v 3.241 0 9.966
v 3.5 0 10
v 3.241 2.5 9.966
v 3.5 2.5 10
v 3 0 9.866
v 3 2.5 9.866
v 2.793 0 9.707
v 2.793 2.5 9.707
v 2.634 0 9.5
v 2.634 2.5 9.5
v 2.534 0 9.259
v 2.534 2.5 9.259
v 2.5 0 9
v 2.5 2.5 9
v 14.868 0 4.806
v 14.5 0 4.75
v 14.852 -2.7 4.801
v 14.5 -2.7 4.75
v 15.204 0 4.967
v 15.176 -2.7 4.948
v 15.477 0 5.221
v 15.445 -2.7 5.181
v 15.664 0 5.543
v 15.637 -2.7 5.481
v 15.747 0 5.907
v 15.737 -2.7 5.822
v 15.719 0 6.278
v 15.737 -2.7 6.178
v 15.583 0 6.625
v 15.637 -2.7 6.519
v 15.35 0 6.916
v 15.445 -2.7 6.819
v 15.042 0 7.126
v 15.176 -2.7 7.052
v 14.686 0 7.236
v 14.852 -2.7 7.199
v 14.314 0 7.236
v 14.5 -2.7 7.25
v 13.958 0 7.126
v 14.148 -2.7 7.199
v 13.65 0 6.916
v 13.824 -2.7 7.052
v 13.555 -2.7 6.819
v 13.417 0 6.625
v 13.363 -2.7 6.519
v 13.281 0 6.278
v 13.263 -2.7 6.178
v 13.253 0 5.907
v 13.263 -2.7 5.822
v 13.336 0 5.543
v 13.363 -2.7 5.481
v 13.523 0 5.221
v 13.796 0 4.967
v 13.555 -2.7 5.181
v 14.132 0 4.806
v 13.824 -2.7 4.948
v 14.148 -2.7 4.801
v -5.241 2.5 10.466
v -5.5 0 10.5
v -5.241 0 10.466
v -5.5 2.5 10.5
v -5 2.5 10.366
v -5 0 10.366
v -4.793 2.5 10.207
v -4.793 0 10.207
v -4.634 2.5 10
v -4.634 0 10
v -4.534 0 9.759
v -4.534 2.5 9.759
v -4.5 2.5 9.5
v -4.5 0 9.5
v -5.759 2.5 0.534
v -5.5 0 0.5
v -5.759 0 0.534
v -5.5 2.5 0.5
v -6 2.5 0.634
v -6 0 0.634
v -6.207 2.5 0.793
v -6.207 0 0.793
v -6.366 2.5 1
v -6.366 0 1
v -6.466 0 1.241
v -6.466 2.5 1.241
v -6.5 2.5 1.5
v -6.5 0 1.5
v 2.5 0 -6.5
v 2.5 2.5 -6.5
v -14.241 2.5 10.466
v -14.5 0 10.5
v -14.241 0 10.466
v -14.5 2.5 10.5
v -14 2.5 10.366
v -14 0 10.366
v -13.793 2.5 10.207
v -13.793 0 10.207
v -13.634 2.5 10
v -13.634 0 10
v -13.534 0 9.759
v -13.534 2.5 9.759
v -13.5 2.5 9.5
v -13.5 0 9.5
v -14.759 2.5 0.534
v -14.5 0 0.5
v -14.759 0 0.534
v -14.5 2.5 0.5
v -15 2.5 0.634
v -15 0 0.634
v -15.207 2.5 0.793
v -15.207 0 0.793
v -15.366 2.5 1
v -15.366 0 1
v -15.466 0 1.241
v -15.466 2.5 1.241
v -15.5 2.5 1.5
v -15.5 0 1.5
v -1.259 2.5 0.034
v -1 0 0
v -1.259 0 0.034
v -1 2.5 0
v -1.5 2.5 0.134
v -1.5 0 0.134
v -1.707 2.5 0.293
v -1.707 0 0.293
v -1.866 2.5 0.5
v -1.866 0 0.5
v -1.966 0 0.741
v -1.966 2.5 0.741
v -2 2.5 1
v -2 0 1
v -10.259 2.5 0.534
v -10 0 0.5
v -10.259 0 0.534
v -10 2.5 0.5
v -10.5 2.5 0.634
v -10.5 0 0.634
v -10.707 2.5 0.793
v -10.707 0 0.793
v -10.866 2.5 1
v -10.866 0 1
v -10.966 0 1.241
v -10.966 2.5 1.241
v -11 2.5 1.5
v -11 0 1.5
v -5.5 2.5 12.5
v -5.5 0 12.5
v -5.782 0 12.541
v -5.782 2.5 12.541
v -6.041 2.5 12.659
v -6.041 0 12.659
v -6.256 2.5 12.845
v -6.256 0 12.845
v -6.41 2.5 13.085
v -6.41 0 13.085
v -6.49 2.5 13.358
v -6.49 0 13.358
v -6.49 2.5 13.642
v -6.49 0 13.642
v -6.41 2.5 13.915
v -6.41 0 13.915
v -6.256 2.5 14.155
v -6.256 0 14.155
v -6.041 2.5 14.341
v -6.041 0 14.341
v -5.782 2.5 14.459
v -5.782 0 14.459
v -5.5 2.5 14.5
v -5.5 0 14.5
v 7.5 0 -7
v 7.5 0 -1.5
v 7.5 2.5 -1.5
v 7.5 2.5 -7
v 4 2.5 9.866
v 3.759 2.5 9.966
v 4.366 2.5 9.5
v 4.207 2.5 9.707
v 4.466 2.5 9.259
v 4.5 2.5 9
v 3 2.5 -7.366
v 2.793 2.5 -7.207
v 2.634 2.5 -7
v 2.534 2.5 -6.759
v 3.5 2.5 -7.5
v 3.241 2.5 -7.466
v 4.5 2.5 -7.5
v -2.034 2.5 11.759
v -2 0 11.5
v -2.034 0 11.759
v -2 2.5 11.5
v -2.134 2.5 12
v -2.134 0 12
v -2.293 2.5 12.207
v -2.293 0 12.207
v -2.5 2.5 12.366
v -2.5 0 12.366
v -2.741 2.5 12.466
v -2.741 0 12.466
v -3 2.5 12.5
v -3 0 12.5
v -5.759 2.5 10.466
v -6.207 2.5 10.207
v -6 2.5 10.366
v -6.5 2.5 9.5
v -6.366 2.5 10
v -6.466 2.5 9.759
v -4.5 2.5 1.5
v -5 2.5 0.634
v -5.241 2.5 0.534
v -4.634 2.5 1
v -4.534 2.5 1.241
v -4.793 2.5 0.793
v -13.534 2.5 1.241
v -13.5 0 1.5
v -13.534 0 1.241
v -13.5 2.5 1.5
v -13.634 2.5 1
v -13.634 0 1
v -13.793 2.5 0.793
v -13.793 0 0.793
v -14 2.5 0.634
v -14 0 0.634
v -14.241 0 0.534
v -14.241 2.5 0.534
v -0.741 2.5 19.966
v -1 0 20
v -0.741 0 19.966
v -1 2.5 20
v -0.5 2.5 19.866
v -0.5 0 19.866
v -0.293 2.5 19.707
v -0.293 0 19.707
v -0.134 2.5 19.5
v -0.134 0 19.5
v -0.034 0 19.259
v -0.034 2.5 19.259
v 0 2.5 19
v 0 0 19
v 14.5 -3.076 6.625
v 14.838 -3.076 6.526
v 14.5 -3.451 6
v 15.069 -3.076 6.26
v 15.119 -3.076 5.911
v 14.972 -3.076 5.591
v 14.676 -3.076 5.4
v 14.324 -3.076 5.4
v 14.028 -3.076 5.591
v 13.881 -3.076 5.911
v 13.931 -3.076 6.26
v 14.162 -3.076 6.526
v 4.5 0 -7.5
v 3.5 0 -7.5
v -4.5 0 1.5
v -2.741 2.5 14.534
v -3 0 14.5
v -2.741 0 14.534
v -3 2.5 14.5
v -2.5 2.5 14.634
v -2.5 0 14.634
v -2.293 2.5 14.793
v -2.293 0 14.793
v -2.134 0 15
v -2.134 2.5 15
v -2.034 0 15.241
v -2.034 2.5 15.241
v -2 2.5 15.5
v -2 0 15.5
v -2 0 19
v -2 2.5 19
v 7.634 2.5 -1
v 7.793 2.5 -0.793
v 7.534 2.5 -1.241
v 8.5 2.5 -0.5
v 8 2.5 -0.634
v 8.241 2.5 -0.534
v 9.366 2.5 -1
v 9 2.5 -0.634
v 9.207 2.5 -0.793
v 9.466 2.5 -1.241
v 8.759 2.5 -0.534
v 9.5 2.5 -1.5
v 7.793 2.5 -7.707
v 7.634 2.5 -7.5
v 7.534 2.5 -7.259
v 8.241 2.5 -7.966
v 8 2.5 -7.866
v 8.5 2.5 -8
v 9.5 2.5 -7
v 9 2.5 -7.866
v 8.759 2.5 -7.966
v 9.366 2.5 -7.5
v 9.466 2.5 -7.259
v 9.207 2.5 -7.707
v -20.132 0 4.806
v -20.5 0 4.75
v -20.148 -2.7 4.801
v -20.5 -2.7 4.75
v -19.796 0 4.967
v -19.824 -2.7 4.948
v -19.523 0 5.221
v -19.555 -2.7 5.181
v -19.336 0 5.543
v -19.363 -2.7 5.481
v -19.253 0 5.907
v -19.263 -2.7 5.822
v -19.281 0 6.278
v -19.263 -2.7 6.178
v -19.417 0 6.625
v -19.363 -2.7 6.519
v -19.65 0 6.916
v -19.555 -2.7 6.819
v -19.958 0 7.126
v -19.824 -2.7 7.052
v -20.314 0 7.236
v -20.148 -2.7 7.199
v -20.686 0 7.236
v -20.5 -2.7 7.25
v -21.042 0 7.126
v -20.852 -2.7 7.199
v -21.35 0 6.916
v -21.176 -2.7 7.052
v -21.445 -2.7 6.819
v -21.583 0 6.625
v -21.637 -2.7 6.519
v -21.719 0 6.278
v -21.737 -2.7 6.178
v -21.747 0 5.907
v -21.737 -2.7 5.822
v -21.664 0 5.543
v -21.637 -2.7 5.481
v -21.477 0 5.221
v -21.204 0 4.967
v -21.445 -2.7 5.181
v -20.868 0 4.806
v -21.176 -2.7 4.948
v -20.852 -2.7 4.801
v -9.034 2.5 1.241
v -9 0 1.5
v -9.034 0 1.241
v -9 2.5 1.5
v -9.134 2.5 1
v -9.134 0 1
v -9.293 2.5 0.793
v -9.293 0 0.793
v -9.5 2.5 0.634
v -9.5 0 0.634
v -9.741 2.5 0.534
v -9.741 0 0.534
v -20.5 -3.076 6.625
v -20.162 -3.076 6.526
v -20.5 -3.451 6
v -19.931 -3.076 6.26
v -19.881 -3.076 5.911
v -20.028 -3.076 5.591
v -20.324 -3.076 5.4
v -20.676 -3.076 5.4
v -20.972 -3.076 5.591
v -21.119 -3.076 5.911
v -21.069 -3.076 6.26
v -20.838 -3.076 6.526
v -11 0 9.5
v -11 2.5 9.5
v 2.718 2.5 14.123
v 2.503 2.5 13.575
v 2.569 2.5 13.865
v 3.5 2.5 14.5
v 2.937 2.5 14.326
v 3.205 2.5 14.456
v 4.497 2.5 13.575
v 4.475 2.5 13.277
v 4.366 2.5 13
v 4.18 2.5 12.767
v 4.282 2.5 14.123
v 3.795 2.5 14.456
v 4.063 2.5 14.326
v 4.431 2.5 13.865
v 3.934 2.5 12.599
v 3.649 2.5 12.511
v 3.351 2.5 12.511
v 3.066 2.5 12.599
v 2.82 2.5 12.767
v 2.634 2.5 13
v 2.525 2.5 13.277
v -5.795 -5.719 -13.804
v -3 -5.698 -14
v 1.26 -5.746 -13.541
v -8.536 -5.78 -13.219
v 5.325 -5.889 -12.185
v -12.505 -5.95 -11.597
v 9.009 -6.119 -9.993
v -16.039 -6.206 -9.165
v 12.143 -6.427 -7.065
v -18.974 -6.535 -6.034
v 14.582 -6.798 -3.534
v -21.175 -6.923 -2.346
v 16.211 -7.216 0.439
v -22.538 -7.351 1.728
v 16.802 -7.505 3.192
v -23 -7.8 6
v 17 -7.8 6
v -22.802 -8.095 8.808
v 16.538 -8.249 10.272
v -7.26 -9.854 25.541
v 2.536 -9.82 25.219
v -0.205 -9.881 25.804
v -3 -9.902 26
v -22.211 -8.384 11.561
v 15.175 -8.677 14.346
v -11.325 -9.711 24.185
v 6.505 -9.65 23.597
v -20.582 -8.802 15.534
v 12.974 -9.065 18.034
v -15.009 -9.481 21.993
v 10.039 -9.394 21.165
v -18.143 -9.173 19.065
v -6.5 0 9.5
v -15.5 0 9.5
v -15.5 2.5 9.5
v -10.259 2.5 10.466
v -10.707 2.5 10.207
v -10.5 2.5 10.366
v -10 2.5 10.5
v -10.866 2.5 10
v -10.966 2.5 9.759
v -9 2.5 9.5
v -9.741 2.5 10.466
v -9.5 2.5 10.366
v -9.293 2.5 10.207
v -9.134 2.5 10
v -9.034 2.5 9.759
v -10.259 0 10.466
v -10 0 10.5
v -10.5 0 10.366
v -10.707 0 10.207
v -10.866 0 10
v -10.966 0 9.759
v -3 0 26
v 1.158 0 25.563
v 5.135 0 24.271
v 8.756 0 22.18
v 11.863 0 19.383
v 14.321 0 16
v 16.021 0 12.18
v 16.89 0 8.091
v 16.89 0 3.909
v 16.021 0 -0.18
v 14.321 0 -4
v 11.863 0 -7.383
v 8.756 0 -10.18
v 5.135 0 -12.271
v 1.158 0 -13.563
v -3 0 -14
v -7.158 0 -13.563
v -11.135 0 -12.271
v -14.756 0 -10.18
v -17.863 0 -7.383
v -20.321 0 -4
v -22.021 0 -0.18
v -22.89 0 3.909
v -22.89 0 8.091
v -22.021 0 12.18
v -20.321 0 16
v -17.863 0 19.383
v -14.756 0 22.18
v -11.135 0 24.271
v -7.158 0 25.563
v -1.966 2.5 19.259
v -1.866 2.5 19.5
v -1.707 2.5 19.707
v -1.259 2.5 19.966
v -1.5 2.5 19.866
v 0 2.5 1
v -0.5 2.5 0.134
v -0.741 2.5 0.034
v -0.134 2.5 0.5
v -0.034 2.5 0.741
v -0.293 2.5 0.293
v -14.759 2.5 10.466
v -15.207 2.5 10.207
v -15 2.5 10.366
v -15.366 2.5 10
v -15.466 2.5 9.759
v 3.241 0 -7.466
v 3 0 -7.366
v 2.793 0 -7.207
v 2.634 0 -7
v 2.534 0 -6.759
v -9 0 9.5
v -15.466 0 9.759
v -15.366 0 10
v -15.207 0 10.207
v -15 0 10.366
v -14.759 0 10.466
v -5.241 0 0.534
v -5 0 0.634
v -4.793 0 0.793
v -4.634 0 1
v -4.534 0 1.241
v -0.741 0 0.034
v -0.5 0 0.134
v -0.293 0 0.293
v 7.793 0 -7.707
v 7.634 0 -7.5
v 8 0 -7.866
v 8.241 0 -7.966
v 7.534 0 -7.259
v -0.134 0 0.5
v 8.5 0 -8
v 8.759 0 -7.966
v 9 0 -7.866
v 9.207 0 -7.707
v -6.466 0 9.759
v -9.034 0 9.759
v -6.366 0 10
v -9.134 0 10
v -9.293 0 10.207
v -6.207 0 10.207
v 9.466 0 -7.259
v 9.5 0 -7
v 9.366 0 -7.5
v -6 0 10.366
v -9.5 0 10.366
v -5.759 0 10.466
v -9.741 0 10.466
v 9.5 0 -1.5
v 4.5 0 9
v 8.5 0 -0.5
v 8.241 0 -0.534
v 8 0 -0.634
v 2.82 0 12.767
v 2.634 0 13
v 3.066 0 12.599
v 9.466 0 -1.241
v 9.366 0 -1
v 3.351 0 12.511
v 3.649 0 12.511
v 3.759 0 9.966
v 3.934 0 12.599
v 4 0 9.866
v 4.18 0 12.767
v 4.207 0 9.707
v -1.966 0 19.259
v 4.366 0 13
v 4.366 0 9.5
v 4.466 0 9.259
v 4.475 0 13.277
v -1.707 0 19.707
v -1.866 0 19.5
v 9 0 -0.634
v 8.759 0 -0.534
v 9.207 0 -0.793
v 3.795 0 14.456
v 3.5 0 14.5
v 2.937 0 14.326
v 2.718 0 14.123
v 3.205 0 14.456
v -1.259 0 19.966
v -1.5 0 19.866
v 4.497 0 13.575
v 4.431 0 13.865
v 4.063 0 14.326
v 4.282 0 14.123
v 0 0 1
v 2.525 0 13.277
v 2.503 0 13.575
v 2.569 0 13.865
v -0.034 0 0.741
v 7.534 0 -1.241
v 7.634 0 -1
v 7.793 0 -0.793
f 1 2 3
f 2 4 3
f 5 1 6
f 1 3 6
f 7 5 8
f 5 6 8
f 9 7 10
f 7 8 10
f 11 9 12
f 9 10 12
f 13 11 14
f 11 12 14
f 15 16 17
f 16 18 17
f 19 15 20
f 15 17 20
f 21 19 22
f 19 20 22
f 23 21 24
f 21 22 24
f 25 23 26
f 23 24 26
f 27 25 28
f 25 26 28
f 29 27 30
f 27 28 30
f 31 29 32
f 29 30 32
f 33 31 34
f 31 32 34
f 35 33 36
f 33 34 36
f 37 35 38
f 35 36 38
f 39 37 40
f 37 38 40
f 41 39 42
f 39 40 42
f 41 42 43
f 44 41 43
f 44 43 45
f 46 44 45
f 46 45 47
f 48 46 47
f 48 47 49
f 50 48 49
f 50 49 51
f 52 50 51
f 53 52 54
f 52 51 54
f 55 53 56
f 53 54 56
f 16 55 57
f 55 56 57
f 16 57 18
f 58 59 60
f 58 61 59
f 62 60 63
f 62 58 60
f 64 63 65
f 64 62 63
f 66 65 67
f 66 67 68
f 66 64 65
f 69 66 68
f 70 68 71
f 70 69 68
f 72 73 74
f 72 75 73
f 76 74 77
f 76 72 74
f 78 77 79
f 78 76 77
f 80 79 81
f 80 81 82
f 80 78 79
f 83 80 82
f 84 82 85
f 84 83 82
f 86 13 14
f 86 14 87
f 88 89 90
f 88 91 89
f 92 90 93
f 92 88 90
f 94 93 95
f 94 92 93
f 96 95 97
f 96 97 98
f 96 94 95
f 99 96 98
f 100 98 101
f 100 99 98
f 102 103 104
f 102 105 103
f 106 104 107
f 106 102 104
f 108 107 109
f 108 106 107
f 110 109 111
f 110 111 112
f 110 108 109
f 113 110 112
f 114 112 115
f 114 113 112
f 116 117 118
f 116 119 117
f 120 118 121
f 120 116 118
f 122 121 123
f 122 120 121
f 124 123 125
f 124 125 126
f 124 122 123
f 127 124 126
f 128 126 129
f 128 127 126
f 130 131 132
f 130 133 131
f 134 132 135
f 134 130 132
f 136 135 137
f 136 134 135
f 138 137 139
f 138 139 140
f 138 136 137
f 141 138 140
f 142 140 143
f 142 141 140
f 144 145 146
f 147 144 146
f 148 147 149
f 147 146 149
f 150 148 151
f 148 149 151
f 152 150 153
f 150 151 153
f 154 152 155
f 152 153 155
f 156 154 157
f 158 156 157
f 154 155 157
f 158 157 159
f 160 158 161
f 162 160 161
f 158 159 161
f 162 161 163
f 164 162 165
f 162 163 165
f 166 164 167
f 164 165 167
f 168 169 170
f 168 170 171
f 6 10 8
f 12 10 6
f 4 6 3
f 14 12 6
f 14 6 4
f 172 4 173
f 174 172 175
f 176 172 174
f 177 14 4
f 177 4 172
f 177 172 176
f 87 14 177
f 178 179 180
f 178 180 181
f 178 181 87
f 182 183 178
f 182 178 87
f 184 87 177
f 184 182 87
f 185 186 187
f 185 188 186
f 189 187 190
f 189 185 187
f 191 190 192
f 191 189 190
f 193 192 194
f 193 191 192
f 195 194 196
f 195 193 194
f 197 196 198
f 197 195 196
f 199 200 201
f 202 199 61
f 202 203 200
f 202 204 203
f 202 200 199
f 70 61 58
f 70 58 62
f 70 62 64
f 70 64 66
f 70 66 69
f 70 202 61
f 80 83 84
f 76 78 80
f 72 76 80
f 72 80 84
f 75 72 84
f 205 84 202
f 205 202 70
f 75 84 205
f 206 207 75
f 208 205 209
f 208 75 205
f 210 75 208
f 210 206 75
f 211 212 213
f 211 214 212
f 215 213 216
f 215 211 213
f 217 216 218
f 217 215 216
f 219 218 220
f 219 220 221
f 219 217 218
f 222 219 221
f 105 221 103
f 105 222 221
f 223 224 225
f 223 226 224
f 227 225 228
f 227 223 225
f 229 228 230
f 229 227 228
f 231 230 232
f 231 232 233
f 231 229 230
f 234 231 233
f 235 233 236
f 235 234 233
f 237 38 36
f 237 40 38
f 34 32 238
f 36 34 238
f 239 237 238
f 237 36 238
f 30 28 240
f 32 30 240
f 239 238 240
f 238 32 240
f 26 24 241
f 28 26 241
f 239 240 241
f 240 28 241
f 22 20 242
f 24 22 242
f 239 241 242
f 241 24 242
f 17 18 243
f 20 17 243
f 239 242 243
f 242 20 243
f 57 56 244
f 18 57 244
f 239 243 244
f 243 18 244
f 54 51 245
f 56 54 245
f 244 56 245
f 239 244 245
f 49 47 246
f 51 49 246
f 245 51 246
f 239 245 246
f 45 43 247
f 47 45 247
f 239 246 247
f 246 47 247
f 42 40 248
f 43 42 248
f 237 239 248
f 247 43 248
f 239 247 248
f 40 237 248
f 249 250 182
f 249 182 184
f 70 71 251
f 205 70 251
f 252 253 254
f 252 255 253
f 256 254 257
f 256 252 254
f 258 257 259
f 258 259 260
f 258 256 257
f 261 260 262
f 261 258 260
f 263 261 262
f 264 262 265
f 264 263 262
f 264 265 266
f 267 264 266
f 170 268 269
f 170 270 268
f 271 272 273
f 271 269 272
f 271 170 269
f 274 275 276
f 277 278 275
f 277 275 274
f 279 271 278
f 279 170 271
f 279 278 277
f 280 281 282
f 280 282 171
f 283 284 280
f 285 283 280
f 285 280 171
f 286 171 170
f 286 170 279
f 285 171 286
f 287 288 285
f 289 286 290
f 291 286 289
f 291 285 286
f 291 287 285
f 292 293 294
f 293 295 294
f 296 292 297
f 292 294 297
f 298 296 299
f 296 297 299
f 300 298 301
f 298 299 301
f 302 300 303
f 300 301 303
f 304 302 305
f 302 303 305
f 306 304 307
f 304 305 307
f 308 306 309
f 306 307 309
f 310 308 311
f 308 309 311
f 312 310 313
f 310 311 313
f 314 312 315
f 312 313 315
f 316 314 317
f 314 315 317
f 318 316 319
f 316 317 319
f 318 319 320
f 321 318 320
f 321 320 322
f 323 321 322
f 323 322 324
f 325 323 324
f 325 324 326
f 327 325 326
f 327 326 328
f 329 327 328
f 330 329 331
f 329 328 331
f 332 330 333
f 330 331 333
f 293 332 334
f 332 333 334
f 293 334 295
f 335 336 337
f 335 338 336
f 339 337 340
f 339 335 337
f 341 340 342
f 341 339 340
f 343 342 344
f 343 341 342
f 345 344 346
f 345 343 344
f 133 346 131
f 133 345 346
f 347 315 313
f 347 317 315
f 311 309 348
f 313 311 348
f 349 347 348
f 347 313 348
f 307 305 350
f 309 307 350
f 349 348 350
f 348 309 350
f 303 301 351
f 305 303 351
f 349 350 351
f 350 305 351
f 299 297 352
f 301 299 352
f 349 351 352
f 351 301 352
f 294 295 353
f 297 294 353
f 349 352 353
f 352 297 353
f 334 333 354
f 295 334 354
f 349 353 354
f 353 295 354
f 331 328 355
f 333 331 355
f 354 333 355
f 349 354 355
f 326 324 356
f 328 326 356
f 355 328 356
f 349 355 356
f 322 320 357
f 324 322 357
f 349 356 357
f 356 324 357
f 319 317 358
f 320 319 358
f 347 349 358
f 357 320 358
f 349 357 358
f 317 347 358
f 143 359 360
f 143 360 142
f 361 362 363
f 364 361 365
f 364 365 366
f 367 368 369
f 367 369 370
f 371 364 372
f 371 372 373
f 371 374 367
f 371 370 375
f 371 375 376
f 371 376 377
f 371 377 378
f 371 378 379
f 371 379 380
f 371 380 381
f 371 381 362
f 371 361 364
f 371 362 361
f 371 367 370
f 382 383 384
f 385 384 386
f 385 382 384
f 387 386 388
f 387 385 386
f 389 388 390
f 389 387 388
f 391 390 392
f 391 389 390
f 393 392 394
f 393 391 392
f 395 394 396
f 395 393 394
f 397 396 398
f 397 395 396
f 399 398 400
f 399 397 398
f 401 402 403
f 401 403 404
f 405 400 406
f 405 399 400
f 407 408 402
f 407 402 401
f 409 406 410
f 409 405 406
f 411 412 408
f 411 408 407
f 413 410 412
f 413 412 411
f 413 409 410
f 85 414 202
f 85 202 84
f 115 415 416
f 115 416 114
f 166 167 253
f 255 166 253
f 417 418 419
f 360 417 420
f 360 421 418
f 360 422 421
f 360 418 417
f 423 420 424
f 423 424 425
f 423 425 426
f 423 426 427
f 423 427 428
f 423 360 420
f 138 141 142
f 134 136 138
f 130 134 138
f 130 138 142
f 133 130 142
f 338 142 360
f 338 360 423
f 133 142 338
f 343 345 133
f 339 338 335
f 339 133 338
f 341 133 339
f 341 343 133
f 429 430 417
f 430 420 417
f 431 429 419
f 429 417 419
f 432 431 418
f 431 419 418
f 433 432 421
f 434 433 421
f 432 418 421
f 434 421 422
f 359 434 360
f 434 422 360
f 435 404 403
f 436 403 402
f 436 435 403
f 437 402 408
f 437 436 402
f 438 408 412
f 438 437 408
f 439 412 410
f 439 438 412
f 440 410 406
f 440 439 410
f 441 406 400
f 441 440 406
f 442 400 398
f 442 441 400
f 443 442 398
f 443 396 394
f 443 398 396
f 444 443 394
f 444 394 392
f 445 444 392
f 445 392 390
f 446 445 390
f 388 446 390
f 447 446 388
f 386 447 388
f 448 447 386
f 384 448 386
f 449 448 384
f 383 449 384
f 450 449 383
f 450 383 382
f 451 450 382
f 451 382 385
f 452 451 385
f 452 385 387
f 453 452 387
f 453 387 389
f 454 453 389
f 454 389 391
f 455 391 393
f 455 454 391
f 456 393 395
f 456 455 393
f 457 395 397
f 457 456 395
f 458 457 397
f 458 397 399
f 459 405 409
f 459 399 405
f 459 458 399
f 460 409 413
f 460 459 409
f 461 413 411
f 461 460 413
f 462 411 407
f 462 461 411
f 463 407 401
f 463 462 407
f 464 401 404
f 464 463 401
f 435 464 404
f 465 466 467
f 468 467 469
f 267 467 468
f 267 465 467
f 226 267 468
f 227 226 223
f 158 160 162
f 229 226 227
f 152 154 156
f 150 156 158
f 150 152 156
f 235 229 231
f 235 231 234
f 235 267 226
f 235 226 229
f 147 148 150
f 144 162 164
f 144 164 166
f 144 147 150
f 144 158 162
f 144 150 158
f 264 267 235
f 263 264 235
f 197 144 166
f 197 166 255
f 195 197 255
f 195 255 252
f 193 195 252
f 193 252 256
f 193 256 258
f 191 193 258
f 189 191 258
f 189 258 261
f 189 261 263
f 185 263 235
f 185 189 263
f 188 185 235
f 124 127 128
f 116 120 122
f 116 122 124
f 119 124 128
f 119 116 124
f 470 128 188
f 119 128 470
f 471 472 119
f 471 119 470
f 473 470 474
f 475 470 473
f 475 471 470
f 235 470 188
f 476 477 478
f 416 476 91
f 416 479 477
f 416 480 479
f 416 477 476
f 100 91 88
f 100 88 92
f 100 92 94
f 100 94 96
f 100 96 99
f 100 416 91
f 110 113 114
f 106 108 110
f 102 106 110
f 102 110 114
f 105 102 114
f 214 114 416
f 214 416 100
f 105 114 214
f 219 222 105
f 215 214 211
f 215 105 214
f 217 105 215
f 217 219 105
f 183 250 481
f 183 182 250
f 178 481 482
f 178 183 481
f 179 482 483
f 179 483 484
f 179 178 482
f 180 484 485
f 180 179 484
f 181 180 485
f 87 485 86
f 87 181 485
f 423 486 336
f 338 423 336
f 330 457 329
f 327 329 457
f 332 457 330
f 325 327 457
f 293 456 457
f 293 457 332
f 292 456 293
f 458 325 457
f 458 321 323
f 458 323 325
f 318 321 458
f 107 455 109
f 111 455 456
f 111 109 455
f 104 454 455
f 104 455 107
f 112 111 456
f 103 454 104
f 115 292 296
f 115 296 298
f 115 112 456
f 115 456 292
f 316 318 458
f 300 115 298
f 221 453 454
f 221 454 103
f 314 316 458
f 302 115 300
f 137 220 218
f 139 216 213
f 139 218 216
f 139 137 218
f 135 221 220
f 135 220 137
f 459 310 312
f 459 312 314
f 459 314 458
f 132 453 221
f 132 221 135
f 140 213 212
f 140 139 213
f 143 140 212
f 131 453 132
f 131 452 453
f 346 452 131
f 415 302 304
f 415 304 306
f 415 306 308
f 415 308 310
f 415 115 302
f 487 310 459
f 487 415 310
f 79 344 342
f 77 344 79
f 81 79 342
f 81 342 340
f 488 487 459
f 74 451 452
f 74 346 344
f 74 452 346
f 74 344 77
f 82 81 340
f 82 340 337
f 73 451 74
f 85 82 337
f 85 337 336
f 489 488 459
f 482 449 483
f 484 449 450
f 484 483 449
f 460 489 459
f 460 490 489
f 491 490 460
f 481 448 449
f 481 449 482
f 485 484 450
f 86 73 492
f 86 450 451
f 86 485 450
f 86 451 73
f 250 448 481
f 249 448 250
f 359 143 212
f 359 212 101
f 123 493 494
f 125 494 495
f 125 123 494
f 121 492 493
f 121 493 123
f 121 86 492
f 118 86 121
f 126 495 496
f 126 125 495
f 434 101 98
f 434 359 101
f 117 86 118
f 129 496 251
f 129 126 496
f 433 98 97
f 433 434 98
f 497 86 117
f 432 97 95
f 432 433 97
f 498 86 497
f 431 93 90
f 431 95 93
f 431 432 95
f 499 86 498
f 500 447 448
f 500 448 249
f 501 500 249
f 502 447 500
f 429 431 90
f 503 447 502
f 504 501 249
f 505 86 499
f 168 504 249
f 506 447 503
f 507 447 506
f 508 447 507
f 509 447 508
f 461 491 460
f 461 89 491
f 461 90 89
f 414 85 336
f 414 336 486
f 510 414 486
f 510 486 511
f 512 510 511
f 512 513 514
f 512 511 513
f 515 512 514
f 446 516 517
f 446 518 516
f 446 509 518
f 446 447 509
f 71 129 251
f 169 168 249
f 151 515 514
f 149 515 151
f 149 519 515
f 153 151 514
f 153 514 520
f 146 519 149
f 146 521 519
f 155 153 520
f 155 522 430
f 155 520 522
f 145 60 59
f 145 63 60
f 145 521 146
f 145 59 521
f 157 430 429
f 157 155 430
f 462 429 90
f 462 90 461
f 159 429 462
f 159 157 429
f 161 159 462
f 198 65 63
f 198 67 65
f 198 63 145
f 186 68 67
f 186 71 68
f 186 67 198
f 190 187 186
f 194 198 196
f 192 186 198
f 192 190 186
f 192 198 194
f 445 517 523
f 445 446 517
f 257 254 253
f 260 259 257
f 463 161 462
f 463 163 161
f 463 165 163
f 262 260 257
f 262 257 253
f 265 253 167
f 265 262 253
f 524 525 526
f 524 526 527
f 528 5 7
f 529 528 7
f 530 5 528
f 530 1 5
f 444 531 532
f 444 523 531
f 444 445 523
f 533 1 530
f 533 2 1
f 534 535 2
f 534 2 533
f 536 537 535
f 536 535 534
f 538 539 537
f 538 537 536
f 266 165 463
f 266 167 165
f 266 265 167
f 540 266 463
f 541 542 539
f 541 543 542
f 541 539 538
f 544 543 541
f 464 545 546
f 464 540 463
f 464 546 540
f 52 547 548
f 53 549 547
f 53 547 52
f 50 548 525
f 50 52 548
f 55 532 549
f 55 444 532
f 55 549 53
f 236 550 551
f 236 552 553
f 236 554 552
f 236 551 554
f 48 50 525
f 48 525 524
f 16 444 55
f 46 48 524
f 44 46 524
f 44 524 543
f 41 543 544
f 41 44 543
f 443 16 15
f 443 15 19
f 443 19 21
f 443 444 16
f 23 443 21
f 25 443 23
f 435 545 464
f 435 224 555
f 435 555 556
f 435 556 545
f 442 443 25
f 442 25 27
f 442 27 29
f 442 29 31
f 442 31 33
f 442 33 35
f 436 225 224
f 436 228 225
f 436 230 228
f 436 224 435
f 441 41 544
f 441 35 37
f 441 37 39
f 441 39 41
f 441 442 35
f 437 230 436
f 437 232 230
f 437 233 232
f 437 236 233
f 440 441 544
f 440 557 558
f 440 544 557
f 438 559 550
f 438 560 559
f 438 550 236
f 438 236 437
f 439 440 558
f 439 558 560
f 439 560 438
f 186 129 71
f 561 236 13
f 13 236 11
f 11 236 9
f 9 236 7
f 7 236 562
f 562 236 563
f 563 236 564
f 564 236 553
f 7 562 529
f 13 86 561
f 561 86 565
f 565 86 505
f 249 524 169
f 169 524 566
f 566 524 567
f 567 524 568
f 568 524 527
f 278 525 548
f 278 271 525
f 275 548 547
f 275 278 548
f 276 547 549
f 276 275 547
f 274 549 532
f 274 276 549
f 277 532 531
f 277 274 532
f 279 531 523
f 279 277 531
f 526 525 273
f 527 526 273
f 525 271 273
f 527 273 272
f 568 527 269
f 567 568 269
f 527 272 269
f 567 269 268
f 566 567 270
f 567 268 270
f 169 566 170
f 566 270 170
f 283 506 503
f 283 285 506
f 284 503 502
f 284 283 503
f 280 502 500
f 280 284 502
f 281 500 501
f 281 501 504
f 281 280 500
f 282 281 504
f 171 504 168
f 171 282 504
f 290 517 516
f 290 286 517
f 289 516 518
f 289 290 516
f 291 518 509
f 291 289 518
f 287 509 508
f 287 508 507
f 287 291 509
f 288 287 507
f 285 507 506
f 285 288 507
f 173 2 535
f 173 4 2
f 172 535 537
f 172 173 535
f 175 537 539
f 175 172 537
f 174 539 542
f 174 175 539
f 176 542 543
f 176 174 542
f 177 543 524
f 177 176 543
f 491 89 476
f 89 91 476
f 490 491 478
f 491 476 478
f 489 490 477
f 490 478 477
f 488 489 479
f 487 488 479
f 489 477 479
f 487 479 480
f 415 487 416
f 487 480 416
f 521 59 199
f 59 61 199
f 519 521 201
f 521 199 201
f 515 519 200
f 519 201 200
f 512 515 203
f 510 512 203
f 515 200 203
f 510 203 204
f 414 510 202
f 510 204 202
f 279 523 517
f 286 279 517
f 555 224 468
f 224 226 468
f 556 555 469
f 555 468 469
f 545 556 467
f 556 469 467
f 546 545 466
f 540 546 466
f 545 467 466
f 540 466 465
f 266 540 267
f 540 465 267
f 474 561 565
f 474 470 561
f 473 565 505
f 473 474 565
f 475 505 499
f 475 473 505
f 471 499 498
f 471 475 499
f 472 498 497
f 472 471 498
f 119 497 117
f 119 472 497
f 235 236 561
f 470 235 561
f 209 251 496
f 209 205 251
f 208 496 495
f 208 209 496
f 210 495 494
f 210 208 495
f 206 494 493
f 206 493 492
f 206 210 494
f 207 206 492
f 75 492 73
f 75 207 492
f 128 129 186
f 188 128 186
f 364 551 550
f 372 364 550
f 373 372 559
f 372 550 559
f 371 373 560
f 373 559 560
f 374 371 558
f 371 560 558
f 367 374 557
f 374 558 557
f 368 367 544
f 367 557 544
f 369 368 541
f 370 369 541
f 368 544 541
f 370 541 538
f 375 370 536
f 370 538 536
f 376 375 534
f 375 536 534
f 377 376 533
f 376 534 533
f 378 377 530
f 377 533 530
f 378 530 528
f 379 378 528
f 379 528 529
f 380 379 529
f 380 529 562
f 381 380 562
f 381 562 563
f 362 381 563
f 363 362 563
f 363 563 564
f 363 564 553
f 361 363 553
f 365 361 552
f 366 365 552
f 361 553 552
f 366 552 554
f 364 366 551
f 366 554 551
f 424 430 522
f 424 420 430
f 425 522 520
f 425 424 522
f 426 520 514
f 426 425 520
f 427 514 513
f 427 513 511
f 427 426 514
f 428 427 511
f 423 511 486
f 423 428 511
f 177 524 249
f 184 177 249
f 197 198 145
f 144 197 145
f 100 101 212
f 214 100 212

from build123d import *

# Parameters (mm, degrees)
BOSS_EXTRUDE2_DEPTH       = 2.5
SKETCH1_R                 = 1
BOSS_EXTRUDE2_2_DEPTH     = 2.5
SKETCH1_W                 = 2
SKETCH1_H                 = 17.5
BOSS_EXTRUDE2_3_DEPTH     = 2.5
SKETCH1_H_2               = 10
BOSS_EXTRUDE2_4_DEPTH     = 2.5
BOSS_EXTRUDE2_5_DEPTH     = 2.5
BOSS_EXTRUDE2_6_DEPTH     = 2.5
SKETCH1_H_3               = 7.5
BOSS_EXTRUDE2_7_DEPTH     = 2.5
SKETCH1_6_R               = 20
BOSS_EXTRUDE3_DEPTH       = 20
CUT_EXTRUDE1_START        = -27.5000001
CUT_EXTRUDE1_DEPTH        = 40.0000001
FILLET1_R                 = 1
M3X0_5_TAPPED_HOLE1_D     = 2.5
M3X0_5_TAPPED_HOLE1_DEPTH = 2.7
M3X0_5_TAPPED_HOLE1_TIP   = 0.751075774


# Read off the part's stored shape, not the designer's step: Cut-Extrude1
with BuildPart() as part:
    # Sketch1 → Boss-Extrude2 (new body)
    with BuildSketch(Plane(origin=(0, 0, 0), x_dir=(1, 0, 0), z_dir=(0, 1, 0))):
        with BuildLine():
            Line((-2, -20), (0, -20))
            Line((0, -20), (0, 0))
            Line((0, 0), (-2, 0))
            Line((-2, 0), (-2, -12.5))
            Line((-2, -12.5), (-5.5, -12.5))
            ThreePointArc((-5.5, -12.5), (-6.5, -13.5), (-5.5, -14.5))
            Line((-5.5, -14.5), (-2, -14.5))
            Line((-2, -14.5), (-2, -20))
        make_face()
    extrude(amount=BOSS_EXTRUDE2_DEPTH)



with BuildPart() as body_2:
    # Sketch1 → Boss-Extrude2 2 (new body)
    with BuildSketch(Plane(origin=(0, 0, 0), x_dir=(1, 0, 0), z_dir=(0, 1, 0))):
        with Locations(Location((3.5, -13.5, 0), (0, 0, 270))):
            Circle(SKETCH1_R)
    extrude(amount=BOSS_EXTRUDE2_2_DEPTH)


with BuildPart() as body_3:
    # Sketch1 → Boss-Extrude2 3 (new body)
    with BuildSketch(Plane(origin=(0, 0, 0), x_dir=(1, 0, 0), z_dir=(0, 1, 0))):
        with Locations((3.5, -1.25)):
            Rectangle(SKETCH1_W, SKETCH1_H)
    extrude(amount=BOSS_EXTRUDE2_3_DEPTH)


with BuildPart() as body_4:
    # Sketch1 → Boss-Extrude2 4 (new body)
    with BuildSketch(Plane(origin=(0, 0, 0), x_dir=(1, 0, 0), z_dir=(0, 1, 0))):
        with Locations((-5.5, -5.5)):
            Rectangle(SKETCH1_W, SKETCH1_H_2)
    extrude(amount=BOSS_EXTRUDE2_4_DEPTH)


with BuildPart() as body_5:
    # Sketch1 → Boss-Extrude2 5 (new body)
    with BuildSketch(Plane(origin=(0, 0, 0), x_dir=(1, 0, 0), z_dir=(0, 1, 0))):
        with Locations((-10, -5.5)):
            Rectangle(SKETCH1_W, SKETCH1_H_2)
    extrude(amount=BOSS_EXTRUDE2_5_DEPTH)


with BuildPart() as body_6:
    # Sketch1 → Boss-Extrude2 6 (new body)
    with BuildSketch(Plane(origin=(0, 0, 0), x_dir=(1, 0, 0), z_dir=(0, 1, 0))):
        with Locations((-14.5, -5.5)):
            Rectangle(SKETCH1_W, SKETCH1_H_2)
    extrude(amount=BOSS_EXTRUDE2_6_DEPTH)


with BuildPart() as body_7:
    # Sketch1 → Boss-Extrude2 7 (new body)
    with BuildSketch(Plane(origin=(0, 0, 0), x_dir=(1, 0, 0), z_dir=(0, 1, 0))):
        with Locations((8.5, 4.25)):
            Rectangle(SKETCH1_W, SKETCH1_H_3)
    extrude(amount=BOSS_EXTRUDE2_7_DEPTH)


with BuildPart() as part_1:
    add(part.part)

    add(body_2.part)  # Boss-Extrude3 merges body 2

    add(body_3.part)  # Boss-Extrude3 merges body 3

    add(body_4.part)  # Boss-Extrude3 merges body 4

    add(body_5.part)  # Boss-Extrude3 merges body 5

    add(body_6.part)  # Boss-Extrude3 merges body 6

    add(body_7.part)  # Boss-Extrude3 merges body 7
    # Sketch1<6> → Boss-Extrude3 (add)
    with BuildSketch(Plane(origin=(0, 0, 0), x_dir=(1, 0, 0), z_dir=(0, 1, 0))):
        with Locations(Location((-3, -6, 0), (0, 0, 270))):
            Circle(SKETCH1_6_R)
    extrude(amount=-BOSS_EXTRUDE3_DEPTH)

    # Cut-Extrude1 outline → Cut-Extrude1 (cut)
    with BuildSketch(Plane(origin=(4.5, 0, 0), x_dir=(0, 0, -1), z_dir=(1, 0, 0)).offset(CUT_EXTRUDE1_START)):
        Polygon((14, -20), (14, -5.697915295), (-26, -9.902084705), (-26, -20), align=None)
    extrude(amount=CUT_EXTRUDE1_DEPTH, mode=Mode.SUBTRACT)

    # Fillet1
    fillet1_edges = [part_1.edges().sort_by_distance(p)[0] for p in [
        (-13.5, 1.25, 10.5),
        (-13.5, 1.25, 0.5),
        (-9, 1.25, 0.5),
        (-9, 1.25, 10.5),
        (-4.5, 1.25, 0.5),
        (-4.5, 1.25, 10.5),
        (0, 1.25, 20),
        (0, 1.25, 0),
        (9.5, 1.25, -8),
        (9.5, 1.25, -0.5),
        (4.5, 1.25, 10),
        (-15.5, 1.25, 0.5),
        (-15.5, 1.25, 10.5),
        (-11, 1.25, 0.5),
        (-11, 1.25, 10.5),
        (-6.5, 1.25, 0.5),
        (-6.5, 1.25, 10.5),
        (7.5, 1.25, -0.5),
        (7.5, 1.25, -8),
        (2.5, 1.25, -7.5),
        (2.5, 1.25, 10),
        (-2, 1.25, 0),
        (-2, 1.25, 14.5),
        (-2, 1.25, 20),
        (-2, 1.25, 12.5),
    ]]
    fillet(fillet1_edges, radius=FILLET1_R - 0.0001)  # a hair under: the kernel refuses the full size

    # M3x0.5 Tapped Hole1
    with Locations(Plane(origin=(14.5, 0, 6), x_dir=(0, 0, 1), z_dir=(0, 1, 0))):
        with Locations((0, 0), (0, -35)):
            Hole(M3X0_5_TAPPED_HOLE1_D / 2, depth=M3X0_5_TAPPED_HOLE1_DEPTH)
            with Locations((0, 0, -(M3X0_5_TAPPED_HOLE1_DEPTH + M3X0_5_TAPPED_HOLE1_TIP / 2))):  # 118° drill point
                Cone(0, M3X0_5_TAPPED_HOLE1_D / 2, M3X0_5_TAPPED_HOLE1_TIP, mode=Mode.SUBTRACT)


solid = part_1.part
